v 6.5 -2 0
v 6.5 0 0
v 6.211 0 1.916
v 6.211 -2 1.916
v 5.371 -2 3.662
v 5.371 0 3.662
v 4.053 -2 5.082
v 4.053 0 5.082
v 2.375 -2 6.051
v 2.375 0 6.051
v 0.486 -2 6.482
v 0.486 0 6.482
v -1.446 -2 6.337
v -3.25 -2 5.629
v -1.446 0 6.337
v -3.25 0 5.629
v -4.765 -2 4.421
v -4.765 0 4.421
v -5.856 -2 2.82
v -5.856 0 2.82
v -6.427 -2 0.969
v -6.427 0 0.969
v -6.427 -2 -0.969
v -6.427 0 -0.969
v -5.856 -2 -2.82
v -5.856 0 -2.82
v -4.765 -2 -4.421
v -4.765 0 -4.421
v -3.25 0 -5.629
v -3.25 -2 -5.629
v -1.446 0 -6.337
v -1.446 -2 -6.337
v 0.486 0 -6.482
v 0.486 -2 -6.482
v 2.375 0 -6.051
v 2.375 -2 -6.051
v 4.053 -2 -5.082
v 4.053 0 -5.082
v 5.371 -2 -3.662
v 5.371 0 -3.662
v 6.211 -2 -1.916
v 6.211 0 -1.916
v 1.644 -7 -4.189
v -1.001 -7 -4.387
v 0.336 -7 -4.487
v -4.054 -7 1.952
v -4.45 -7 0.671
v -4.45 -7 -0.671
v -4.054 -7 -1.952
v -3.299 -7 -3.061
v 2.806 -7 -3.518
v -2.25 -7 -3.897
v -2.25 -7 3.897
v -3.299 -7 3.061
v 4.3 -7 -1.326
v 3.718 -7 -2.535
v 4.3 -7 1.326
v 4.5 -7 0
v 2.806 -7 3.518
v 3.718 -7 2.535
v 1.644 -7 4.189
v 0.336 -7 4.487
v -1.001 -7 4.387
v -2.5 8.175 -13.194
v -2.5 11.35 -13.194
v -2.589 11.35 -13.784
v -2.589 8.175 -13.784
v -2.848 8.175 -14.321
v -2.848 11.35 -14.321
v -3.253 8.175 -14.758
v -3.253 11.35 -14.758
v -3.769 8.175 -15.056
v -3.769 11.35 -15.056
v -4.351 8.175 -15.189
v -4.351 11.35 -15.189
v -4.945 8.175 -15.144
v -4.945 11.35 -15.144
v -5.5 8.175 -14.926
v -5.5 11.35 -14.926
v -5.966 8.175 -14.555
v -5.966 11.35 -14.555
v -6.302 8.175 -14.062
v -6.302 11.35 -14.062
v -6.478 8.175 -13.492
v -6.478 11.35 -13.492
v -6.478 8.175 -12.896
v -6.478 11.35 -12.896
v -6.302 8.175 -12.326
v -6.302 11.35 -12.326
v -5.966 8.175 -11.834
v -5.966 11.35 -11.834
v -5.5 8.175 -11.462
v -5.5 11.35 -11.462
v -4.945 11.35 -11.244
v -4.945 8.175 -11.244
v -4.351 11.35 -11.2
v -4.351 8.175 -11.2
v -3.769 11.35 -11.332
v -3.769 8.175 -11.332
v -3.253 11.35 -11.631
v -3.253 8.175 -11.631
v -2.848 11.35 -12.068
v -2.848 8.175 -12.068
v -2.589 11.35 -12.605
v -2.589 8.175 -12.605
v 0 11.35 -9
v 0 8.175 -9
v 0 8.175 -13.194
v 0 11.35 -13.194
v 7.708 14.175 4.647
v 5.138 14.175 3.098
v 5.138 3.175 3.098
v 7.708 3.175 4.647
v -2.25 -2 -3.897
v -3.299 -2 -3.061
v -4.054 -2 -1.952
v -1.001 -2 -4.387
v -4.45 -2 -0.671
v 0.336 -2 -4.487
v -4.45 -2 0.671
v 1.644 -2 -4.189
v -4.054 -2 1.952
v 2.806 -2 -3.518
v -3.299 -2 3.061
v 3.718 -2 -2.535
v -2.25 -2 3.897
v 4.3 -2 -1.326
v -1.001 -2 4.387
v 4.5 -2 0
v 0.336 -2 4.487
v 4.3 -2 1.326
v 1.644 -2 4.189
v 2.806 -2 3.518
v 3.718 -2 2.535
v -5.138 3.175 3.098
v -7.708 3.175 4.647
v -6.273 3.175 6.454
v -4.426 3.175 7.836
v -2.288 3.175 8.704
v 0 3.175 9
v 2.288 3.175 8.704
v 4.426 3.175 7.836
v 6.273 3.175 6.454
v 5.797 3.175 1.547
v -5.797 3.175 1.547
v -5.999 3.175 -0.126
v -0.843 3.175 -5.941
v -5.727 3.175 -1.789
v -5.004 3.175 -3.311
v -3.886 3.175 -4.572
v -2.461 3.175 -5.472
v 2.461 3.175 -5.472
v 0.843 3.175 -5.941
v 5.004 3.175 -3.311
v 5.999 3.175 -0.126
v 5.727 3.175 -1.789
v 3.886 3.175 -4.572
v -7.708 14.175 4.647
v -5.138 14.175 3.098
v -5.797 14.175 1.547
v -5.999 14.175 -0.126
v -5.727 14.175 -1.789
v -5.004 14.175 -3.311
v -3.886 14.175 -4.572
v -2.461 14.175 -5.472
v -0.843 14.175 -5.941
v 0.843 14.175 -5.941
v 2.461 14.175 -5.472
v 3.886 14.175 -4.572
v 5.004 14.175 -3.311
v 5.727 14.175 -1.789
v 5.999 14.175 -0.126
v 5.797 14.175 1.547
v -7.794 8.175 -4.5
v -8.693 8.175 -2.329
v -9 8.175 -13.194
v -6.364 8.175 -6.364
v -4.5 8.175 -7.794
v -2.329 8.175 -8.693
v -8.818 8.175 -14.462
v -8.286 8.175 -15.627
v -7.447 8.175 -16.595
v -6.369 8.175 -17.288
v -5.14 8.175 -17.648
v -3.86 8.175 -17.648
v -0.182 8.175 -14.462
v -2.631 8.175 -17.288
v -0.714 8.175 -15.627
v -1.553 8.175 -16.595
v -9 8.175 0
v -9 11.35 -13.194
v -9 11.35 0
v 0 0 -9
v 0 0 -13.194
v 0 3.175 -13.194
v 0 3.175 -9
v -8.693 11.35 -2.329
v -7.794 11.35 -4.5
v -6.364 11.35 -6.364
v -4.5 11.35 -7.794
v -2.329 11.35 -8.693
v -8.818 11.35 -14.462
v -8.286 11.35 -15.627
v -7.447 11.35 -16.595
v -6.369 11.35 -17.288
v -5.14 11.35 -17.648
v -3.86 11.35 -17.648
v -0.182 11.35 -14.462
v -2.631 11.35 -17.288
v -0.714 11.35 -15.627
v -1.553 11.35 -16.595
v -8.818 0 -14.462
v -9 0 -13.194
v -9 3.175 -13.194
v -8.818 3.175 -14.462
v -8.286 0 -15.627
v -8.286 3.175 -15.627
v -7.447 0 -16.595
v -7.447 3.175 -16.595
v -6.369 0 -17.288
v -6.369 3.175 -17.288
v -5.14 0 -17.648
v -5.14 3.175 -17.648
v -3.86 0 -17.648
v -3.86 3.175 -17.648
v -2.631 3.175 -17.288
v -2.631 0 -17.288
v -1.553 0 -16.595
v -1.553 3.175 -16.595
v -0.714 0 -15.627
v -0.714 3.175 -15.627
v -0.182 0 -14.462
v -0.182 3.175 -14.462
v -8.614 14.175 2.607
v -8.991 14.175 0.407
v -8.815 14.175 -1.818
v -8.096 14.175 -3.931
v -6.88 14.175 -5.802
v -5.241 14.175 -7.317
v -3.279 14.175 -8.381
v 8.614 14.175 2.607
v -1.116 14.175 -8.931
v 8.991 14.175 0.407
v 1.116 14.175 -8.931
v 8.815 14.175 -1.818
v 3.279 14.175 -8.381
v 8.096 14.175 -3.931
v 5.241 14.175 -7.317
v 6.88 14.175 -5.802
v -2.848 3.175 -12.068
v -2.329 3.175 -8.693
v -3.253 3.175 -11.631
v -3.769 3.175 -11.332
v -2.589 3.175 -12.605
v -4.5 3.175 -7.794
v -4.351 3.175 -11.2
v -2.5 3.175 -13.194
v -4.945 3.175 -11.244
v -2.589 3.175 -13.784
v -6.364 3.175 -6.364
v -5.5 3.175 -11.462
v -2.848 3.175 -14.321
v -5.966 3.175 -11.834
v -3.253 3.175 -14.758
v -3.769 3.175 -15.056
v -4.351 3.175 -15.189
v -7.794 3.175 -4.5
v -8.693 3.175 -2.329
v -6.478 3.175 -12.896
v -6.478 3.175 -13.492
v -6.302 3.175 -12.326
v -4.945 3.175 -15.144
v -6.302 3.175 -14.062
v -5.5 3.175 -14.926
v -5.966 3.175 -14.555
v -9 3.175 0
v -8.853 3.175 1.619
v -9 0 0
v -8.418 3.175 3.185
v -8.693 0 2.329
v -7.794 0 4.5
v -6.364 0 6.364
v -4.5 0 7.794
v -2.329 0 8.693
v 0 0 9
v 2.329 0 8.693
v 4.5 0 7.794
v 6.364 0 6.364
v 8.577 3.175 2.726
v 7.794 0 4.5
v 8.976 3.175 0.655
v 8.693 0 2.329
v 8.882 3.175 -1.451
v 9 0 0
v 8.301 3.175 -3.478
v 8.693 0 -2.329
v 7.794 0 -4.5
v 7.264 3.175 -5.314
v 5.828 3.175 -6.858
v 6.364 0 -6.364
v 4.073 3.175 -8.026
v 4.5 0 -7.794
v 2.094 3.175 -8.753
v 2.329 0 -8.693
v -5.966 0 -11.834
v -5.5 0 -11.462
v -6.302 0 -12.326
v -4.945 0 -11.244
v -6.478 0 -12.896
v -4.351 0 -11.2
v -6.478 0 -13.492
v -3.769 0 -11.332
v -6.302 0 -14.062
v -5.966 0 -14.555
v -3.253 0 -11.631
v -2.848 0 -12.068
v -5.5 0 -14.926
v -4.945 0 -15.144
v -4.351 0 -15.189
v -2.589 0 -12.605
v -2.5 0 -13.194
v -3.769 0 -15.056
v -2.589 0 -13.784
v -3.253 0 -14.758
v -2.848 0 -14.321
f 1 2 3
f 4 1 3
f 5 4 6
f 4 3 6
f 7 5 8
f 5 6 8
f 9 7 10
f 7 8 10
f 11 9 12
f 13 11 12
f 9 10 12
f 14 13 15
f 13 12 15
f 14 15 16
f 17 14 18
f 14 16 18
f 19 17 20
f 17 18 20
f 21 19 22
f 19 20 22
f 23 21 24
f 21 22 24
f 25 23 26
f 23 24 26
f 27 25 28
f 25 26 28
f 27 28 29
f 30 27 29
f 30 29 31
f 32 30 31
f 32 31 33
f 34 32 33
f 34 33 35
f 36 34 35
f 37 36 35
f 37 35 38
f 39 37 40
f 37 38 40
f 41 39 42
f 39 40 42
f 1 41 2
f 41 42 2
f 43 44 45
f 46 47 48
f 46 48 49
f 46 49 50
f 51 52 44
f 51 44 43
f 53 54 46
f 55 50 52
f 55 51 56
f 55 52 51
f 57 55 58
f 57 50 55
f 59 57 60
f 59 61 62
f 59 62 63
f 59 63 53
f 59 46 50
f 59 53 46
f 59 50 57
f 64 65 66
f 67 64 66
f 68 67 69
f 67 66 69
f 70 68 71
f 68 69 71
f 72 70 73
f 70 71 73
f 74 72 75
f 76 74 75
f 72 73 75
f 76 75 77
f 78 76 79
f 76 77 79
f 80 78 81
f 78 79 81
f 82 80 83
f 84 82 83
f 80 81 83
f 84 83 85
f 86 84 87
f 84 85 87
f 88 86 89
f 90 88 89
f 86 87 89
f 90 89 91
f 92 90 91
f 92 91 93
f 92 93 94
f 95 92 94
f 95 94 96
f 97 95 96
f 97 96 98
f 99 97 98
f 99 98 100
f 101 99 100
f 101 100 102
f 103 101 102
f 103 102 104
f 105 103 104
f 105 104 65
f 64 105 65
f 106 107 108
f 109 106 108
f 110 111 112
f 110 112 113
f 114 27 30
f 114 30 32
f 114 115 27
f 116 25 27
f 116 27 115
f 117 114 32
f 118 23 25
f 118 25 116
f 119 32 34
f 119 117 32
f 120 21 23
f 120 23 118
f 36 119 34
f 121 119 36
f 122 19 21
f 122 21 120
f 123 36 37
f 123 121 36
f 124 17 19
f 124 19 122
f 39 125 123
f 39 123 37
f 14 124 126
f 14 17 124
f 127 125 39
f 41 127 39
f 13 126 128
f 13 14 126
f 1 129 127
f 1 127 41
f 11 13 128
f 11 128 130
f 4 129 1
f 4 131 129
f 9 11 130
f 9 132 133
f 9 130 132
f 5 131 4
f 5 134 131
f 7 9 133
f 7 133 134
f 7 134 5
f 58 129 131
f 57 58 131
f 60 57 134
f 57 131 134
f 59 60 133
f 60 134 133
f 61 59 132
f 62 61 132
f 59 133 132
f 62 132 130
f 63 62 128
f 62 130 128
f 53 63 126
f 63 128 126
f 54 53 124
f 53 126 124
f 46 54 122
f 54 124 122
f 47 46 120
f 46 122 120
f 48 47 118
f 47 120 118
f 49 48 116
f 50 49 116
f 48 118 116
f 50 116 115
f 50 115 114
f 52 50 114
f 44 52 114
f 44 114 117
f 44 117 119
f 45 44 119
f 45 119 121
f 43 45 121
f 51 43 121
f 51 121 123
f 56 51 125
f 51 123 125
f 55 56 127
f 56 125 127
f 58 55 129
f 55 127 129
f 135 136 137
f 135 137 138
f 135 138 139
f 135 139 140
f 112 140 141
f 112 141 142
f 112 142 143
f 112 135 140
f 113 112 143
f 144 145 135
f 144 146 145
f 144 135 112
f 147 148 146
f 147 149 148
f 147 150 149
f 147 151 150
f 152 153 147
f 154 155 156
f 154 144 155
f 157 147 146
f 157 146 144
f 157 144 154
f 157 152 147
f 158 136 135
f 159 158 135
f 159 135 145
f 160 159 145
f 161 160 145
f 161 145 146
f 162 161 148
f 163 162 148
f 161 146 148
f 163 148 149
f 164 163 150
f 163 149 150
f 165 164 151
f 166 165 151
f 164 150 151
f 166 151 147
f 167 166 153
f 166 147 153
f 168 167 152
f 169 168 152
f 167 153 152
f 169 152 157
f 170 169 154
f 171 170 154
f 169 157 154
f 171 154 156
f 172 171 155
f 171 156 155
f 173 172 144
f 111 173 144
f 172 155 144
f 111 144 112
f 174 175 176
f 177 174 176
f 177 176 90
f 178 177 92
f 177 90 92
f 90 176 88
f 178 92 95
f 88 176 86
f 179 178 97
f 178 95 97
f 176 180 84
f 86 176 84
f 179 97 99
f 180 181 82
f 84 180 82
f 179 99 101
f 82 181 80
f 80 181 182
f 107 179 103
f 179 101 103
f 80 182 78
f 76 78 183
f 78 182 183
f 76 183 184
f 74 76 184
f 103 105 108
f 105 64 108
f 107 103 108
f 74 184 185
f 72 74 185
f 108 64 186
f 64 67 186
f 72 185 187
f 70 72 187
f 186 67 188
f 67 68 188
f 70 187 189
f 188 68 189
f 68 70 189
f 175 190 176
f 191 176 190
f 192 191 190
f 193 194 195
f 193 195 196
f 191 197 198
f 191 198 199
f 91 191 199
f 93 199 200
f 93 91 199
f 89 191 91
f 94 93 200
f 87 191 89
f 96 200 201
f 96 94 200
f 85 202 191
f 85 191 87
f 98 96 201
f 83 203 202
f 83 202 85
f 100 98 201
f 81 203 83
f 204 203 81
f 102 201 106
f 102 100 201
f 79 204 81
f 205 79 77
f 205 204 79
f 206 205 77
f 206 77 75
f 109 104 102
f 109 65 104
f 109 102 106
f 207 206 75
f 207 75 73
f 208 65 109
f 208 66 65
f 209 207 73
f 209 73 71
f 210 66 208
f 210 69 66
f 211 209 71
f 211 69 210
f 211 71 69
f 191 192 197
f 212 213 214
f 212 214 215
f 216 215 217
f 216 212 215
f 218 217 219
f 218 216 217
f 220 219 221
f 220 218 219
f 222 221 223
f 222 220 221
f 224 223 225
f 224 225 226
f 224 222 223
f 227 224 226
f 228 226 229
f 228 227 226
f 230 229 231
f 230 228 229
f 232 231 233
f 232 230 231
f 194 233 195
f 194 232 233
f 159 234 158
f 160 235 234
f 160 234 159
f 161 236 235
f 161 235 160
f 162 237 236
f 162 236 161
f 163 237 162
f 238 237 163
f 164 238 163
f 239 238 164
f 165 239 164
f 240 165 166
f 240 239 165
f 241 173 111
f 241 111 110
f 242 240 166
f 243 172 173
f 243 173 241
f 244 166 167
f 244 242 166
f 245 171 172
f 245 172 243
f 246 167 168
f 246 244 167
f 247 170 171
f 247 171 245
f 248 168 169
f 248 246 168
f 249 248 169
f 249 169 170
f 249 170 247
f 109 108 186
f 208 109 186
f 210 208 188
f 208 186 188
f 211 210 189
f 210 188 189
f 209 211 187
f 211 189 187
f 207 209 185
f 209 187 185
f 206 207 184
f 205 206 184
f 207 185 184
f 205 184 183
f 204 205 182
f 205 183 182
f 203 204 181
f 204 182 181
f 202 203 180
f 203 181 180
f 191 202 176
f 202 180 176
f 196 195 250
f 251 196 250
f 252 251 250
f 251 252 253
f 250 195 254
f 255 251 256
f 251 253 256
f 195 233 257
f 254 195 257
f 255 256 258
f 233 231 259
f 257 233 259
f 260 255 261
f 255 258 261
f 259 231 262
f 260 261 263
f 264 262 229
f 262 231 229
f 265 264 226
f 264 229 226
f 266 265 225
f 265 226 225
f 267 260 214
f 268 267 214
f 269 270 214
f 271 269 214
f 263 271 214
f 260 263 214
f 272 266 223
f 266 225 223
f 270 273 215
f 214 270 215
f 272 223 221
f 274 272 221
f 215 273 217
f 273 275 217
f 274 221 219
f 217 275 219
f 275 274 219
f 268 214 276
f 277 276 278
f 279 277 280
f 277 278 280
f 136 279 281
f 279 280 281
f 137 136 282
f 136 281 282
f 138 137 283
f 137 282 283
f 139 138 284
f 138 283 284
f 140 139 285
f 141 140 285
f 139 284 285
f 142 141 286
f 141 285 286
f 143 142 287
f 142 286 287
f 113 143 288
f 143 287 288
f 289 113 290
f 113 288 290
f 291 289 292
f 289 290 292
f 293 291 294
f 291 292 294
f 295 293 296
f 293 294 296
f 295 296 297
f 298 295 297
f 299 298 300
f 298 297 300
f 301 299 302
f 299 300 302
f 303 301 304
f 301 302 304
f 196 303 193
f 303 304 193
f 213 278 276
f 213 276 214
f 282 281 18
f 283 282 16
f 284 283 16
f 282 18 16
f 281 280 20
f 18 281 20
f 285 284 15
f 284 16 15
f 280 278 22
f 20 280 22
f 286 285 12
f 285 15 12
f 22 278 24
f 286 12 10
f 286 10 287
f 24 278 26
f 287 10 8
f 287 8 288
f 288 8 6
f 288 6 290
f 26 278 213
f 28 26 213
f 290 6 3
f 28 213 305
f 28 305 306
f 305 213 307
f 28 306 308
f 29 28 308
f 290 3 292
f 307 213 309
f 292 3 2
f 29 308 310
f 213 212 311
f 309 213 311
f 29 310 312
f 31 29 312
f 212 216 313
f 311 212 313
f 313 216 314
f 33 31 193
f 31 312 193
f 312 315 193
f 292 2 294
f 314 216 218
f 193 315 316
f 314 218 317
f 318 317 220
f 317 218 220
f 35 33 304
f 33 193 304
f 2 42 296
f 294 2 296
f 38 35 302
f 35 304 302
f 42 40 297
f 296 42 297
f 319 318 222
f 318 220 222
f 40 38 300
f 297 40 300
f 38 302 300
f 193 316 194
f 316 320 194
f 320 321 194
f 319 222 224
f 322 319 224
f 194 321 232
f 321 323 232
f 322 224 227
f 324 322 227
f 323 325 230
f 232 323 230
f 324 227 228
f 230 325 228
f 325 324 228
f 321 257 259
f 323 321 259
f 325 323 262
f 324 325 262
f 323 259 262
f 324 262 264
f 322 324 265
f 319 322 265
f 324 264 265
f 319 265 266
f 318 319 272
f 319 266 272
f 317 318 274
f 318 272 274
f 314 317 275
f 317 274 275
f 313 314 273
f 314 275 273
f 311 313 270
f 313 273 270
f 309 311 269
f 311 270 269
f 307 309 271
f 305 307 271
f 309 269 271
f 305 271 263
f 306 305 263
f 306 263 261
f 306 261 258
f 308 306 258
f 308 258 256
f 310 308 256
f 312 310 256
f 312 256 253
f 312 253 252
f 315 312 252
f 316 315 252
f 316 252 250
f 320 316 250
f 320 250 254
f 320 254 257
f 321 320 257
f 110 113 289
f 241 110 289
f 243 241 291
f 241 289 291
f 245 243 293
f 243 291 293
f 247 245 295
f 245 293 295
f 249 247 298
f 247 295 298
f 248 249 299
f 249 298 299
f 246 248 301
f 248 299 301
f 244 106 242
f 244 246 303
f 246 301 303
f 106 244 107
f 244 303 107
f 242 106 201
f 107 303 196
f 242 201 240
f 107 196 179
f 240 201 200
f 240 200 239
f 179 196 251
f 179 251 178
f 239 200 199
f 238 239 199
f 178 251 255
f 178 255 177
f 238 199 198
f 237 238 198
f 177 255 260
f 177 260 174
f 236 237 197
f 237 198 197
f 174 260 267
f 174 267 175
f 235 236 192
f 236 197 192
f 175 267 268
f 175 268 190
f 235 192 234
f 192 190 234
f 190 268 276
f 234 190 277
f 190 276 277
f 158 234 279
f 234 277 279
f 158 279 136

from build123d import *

# Parameters (mm, degrees)
SKETCH1_R           = 9
BOSS_EXTRUDE1_DEPTH = 3.175
BOSS_EXTRUDE2_DEPTH = 11
SKETCH3_R           = 6.5
BOSS_EXTRUDE3_DEPTH = 2
SKETCH4_R           = 4.5
BOSS_EXTRUDE4_DEPTH = 5
BOSS_EXTRUDE5_DEPTH = 3.175
BOSS_EXTRUDE7_DEPTH = 3.175
SKETCH8_R           = 2
CUT_EXTRUDE1_DEPTH  = 11.35


with BuildPart() as part:
    # Sketch1 → Boss-Extrude1 (new body)
    with BuildSketch(Plane(origin=(0, 0, 0), x_dir=(1, 0, 0), z_dir=(0, 1, 0))):
        Circle(SKETCH1_R)
    extrude(amount=BOSS_EXTRUDE1_DEPTH)

    # Sketch2 → Boss-Extrude2 (add)
    with BuildSketch(Plane(origin=(0, 3.175, 0), x_dir=(1, 0, 0), z_dir=(0, 1, 0))):
        with BuildLine():
            Line((-7.707704384, -4.646643211), (-5.138469589, -3.097762141))
            ThreePointArc((-5.138469589, -3.097762141), (0, 6), (5.138469589, -3.097762141))
            Line((5.138469589, -3.097762141), (7.707704384, -4.646643211))
            ThreePointArc((7.707704384, -4.646643211), (0, 9), (-7.707704384, -4.646643211))
        make_face()
    extrude(amount=BOSS_EXTRUDE2_DEPTH)

    # Sketch3 → Boss-Extrude3 (add)
    with BuildSketch(Plane.XZ):
        Circle(SKETCH3_R)
    extrude(amount=BOSS_EXTRUDE3_DEPTH)

    # Sketch4 → Boss-Extrude4 (add)
    with BuildSketch(Plane.XZ.offset(2)):
        Circle(SKETCH4_R)
    extrude(amount=BOSS_EXTRUDE4_DEPTH)

    # Sketch6 → Boss-Extrude5 (add)
    with BuildSketch(Plane(origin=(0, 0, 0), x_dir=(1, 0, 0), z_dir=(0, 1, 0))):
        with BuildLine():
            Line((-9, 0), (-9, 13.194197425))
            ThreePointArc((-9, 13.194197425), (-4.5, 17.694197425), (0, 13.194197425))
            Line((0, 13.194197425), (0, 9))
            ThreePointArc((0, 9), (-6.363961031, 6.363961031), (-9, 0))
        make_face()
    extrude(amount=BOSS_EXTRUDE5_DEPTH)

    # Sketch7 → Boss-Extrude7 (add)
    with BuildSketch(Plane(origin=(0, 8.174999906, 0), x_dir=(1, 0, 0), z_dir=(0, 1, 0))):
        with BuildLine():
            Line((0, 9), (0, 13.194197425))
            ThreePointArc((0, 13.194197425), (-4.5, 17.694197425), (-9, 13.194197425))
            Line((-9, 13.194197425), (-9, 0))
            ThreePointArc((-9, 0), (-6.363961031, 6.363961031), (0, 9))
        make_face()
    extrude(amount=BOSS_EXTRUDE7_DEPTH)

    # Sketch8 → Cut-Extrude1 (cut)
    with BuildSketch(Plane(origin=(0, 11.349999906, 0), x_dir=(1, 0, 0), z_dir=(0, 1, 0))):
        with Locations((-4.5, 13.194197425)):
            Circle(SKETCH8_R)
    extrude(amount=-CUT_EXTRUDE1_DEPTH, mode=Mode.SUBTRACT)


solid = part.part
